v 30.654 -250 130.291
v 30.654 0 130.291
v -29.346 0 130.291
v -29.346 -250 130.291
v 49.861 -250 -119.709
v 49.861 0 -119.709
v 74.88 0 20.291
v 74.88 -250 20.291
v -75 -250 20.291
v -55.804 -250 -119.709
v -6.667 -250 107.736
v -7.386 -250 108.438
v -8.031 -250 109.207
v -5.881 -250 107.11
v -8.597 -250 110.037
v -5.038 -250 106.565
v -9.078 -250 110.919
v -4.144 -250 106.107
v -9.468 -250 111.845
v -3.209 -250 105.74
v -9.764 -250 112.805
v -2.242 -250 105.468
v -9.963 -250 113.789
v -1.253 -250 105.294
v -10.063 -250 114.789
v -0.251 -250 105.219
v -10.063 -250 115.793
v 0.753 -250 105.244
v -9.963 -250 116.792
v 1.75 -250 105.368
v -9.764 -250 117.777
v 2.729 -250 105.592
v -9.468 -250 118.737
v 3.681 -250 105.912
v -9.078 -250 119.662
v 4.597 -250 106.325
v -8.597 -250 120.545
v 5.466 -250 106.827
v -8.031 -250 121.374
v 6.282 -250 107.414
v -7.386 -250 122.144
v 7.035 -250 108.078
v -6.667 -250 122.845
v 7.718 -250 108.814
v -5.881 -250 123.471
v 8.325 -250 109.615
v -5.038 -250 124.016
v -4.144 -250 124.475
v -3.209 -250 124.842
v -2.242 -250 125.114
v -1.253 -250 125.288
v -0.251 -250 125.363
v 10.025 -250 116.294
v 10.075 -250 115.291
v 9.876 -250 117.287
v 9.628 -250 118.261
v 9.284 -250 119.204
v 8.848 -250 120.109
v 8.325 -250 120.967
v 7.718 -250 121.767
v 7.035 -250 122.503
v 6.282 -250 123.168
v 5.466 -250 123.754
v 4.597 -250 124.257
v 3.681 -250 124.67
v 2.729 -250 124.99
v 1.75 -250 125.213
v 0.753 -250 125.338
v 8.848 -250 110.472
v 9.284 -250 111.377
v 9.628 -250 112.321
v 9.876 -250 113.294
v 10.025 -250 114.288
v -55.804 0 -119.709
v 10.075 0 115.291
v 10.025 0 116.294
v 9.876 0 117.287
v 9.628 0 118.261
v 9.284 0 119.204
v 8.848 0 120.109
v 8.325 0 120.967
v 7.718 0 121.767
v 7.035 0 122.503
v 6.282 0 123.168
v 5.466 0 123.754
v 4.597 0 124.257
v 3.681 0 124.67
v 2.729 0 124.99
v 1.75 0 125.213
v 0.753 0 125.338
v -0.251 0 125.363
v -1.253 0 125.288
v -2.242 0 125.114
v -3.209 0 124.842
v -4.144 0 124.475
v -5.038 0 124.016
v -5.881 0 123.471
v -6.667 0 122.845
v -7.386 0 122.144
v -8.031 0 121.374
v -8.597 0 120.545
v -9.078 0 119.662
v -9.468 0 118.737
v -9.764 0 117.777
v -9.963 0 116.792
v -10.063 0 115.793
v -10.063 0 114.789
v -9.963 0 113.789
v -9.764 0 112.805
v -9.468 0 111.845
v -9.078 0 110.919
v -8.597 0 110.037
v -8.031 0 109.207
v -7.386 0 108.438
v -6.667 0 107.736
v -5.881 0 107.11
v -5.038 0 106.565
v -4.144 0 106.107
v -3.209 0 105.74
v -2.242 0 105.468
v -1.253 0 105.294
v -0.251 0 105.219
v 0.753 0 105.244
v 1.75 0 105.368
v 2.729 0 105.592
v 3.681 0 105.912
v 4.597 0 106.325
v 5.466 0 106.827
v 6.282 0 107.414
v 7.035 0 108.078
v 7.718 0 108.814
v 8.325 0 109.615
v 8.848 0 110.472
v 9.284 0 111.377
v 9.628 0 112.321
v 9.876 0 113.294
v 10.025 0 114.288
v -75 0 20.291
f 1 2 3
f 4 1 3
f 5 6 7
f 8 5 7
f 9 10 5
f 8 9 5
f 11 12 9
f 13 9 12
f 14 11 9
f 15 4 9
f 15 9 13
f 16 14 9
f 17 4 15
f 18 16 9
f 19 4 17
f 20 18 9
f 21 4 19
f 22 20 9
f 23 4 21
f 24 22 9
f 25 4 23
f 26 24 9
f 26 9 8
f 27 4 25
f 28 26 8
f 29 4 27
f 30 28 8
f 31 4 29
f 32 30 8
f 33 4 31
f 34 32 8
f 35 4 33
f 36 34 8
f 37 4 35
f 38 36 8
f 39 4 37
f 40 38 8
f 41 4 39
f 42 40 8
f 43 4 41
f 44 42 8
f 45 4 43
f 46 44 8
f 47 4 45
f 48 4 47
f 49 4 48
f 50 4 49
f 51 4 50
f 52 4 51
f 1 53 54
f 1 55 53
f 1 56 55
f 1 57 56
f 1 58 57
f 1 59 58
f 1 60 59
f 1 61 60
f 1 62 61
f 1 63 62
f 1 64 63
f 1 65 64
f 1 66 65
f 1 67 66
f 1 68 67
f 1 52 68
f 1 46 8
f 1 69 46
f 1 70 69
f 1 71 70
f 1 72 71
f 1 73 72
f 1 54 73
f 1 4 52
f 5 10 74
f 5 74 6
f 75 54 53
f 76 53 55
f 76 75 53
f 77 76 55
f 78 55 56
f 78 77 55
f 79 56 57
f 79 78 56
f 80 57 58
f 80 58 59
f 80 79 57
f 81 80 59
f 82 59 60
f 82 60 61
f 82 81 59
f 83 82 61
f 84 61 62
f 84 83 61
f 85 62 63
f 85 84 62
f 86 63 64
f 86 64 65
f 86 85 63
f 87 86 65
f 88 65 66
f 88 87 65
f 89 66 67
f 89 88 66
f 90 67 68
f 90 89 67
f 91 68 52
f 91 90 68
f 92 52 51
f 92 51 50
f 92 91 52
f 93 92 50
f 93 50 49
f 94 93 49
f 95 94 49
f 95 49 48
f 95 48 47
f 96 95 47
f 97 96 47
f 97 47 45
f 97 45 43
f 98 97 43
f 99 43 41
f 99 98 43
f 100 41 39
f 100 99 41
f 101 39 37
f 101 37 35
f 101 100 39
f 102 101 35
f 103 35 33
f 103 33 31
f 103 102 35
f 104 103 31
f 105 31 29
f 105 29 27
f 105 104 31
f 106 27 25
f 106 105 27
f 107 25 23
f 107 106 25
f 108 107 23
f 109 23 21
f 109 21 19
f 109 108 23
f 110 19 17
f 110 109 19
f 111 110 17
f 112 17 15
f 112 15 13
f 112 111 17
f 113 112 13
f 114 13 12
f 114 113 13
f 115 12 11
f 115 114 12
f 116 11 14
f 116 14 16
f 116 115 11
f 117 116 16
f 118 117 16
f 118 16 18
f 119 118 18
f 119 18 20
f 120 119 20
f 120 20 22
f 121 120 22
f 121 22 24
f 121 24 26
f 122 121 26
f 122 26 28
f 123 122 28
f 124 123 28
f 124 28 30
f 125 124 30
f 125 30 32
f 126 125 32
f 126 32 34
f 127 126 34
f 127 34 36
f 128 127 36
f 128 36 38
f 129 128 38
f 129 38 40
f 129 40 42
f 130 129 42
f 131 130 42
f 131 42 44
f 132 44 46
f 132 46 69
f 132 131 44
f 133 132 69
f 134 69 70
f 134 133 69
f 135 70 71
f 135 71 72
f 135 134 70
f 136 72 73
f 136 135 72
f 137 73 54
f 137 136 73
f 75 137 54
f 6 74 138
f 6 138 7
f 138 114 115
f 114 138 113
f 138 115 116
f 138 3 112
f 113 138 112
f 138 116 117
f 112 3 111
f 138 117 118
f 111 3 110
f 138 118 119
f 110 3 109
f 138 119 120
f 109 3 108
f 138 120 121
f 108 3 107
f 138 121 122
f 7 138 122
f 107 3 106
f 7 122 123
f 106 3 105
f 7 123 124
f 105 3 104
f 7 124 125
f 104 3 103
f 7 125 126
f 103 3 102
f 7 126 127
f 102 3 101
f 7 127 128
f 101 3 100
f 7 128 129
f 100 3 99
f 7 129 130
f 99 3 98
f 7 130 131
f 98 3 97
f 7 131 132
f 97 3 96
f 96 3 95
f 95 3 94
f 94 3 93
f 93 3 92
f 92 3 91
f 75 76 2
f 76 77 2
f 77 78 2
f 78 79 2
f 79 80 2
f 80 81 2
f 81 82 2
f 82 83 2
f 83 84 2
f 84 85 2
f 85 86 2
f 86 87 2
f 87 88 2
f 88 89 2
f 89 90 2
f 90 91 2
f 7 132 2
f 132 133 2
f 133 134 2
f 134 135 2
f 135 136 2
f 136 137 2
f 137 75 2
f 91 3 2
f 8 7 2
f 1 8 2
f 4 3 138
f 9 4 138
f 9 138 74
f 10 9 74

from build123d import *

# Parameters (mm, degrees)
F0_R     = 10.0754230866
F1_DEPTH = 250


with BuildPart() as f1:
    # F0 (on Front) → F1 (new body)
    with BuildSketch(Plane.XZ):
        Polygon((1.384e-07, 130.2908220107), (-29.3460638914, 130.2908220107), (-75, 20.2908220107), (-55.803976953, -119.7091779893), (49.8614832759, -119.7091779893), (74.8796984553, 20.2908220107), (30.6539361086, 130.2908220107), align=None)
        with BuildLine():
            ThreePointArc((15, 115.2908220107), (-10.6066017667, 104.6842203418), (1.384e-07, 130.2908220107))
            ThreePointArc((1.384e-07, 130.2908220107), (10.6066017667, 125.8974236795), (15, 115.2908220107))
        make_face(mode=Mode.SUBTRACT)
        with BuildLine():
            ThreePointArc((15, 115.2908220107), (10.6066017667, 125.8974236795), (1.384e-07, 130.2908220107))
            ThreePointArc((1.384e-07, 130.2908220107), (-10.6066017667, 104.6842203418), (15, 115.2908220107))
        make_face()
        with Locations((0, 115.2908220107)):
            Circle(F0_R, mode=Mode.SUBTRACT)
    extrude(amount=F1_DEPTH)


solid = f1.part
